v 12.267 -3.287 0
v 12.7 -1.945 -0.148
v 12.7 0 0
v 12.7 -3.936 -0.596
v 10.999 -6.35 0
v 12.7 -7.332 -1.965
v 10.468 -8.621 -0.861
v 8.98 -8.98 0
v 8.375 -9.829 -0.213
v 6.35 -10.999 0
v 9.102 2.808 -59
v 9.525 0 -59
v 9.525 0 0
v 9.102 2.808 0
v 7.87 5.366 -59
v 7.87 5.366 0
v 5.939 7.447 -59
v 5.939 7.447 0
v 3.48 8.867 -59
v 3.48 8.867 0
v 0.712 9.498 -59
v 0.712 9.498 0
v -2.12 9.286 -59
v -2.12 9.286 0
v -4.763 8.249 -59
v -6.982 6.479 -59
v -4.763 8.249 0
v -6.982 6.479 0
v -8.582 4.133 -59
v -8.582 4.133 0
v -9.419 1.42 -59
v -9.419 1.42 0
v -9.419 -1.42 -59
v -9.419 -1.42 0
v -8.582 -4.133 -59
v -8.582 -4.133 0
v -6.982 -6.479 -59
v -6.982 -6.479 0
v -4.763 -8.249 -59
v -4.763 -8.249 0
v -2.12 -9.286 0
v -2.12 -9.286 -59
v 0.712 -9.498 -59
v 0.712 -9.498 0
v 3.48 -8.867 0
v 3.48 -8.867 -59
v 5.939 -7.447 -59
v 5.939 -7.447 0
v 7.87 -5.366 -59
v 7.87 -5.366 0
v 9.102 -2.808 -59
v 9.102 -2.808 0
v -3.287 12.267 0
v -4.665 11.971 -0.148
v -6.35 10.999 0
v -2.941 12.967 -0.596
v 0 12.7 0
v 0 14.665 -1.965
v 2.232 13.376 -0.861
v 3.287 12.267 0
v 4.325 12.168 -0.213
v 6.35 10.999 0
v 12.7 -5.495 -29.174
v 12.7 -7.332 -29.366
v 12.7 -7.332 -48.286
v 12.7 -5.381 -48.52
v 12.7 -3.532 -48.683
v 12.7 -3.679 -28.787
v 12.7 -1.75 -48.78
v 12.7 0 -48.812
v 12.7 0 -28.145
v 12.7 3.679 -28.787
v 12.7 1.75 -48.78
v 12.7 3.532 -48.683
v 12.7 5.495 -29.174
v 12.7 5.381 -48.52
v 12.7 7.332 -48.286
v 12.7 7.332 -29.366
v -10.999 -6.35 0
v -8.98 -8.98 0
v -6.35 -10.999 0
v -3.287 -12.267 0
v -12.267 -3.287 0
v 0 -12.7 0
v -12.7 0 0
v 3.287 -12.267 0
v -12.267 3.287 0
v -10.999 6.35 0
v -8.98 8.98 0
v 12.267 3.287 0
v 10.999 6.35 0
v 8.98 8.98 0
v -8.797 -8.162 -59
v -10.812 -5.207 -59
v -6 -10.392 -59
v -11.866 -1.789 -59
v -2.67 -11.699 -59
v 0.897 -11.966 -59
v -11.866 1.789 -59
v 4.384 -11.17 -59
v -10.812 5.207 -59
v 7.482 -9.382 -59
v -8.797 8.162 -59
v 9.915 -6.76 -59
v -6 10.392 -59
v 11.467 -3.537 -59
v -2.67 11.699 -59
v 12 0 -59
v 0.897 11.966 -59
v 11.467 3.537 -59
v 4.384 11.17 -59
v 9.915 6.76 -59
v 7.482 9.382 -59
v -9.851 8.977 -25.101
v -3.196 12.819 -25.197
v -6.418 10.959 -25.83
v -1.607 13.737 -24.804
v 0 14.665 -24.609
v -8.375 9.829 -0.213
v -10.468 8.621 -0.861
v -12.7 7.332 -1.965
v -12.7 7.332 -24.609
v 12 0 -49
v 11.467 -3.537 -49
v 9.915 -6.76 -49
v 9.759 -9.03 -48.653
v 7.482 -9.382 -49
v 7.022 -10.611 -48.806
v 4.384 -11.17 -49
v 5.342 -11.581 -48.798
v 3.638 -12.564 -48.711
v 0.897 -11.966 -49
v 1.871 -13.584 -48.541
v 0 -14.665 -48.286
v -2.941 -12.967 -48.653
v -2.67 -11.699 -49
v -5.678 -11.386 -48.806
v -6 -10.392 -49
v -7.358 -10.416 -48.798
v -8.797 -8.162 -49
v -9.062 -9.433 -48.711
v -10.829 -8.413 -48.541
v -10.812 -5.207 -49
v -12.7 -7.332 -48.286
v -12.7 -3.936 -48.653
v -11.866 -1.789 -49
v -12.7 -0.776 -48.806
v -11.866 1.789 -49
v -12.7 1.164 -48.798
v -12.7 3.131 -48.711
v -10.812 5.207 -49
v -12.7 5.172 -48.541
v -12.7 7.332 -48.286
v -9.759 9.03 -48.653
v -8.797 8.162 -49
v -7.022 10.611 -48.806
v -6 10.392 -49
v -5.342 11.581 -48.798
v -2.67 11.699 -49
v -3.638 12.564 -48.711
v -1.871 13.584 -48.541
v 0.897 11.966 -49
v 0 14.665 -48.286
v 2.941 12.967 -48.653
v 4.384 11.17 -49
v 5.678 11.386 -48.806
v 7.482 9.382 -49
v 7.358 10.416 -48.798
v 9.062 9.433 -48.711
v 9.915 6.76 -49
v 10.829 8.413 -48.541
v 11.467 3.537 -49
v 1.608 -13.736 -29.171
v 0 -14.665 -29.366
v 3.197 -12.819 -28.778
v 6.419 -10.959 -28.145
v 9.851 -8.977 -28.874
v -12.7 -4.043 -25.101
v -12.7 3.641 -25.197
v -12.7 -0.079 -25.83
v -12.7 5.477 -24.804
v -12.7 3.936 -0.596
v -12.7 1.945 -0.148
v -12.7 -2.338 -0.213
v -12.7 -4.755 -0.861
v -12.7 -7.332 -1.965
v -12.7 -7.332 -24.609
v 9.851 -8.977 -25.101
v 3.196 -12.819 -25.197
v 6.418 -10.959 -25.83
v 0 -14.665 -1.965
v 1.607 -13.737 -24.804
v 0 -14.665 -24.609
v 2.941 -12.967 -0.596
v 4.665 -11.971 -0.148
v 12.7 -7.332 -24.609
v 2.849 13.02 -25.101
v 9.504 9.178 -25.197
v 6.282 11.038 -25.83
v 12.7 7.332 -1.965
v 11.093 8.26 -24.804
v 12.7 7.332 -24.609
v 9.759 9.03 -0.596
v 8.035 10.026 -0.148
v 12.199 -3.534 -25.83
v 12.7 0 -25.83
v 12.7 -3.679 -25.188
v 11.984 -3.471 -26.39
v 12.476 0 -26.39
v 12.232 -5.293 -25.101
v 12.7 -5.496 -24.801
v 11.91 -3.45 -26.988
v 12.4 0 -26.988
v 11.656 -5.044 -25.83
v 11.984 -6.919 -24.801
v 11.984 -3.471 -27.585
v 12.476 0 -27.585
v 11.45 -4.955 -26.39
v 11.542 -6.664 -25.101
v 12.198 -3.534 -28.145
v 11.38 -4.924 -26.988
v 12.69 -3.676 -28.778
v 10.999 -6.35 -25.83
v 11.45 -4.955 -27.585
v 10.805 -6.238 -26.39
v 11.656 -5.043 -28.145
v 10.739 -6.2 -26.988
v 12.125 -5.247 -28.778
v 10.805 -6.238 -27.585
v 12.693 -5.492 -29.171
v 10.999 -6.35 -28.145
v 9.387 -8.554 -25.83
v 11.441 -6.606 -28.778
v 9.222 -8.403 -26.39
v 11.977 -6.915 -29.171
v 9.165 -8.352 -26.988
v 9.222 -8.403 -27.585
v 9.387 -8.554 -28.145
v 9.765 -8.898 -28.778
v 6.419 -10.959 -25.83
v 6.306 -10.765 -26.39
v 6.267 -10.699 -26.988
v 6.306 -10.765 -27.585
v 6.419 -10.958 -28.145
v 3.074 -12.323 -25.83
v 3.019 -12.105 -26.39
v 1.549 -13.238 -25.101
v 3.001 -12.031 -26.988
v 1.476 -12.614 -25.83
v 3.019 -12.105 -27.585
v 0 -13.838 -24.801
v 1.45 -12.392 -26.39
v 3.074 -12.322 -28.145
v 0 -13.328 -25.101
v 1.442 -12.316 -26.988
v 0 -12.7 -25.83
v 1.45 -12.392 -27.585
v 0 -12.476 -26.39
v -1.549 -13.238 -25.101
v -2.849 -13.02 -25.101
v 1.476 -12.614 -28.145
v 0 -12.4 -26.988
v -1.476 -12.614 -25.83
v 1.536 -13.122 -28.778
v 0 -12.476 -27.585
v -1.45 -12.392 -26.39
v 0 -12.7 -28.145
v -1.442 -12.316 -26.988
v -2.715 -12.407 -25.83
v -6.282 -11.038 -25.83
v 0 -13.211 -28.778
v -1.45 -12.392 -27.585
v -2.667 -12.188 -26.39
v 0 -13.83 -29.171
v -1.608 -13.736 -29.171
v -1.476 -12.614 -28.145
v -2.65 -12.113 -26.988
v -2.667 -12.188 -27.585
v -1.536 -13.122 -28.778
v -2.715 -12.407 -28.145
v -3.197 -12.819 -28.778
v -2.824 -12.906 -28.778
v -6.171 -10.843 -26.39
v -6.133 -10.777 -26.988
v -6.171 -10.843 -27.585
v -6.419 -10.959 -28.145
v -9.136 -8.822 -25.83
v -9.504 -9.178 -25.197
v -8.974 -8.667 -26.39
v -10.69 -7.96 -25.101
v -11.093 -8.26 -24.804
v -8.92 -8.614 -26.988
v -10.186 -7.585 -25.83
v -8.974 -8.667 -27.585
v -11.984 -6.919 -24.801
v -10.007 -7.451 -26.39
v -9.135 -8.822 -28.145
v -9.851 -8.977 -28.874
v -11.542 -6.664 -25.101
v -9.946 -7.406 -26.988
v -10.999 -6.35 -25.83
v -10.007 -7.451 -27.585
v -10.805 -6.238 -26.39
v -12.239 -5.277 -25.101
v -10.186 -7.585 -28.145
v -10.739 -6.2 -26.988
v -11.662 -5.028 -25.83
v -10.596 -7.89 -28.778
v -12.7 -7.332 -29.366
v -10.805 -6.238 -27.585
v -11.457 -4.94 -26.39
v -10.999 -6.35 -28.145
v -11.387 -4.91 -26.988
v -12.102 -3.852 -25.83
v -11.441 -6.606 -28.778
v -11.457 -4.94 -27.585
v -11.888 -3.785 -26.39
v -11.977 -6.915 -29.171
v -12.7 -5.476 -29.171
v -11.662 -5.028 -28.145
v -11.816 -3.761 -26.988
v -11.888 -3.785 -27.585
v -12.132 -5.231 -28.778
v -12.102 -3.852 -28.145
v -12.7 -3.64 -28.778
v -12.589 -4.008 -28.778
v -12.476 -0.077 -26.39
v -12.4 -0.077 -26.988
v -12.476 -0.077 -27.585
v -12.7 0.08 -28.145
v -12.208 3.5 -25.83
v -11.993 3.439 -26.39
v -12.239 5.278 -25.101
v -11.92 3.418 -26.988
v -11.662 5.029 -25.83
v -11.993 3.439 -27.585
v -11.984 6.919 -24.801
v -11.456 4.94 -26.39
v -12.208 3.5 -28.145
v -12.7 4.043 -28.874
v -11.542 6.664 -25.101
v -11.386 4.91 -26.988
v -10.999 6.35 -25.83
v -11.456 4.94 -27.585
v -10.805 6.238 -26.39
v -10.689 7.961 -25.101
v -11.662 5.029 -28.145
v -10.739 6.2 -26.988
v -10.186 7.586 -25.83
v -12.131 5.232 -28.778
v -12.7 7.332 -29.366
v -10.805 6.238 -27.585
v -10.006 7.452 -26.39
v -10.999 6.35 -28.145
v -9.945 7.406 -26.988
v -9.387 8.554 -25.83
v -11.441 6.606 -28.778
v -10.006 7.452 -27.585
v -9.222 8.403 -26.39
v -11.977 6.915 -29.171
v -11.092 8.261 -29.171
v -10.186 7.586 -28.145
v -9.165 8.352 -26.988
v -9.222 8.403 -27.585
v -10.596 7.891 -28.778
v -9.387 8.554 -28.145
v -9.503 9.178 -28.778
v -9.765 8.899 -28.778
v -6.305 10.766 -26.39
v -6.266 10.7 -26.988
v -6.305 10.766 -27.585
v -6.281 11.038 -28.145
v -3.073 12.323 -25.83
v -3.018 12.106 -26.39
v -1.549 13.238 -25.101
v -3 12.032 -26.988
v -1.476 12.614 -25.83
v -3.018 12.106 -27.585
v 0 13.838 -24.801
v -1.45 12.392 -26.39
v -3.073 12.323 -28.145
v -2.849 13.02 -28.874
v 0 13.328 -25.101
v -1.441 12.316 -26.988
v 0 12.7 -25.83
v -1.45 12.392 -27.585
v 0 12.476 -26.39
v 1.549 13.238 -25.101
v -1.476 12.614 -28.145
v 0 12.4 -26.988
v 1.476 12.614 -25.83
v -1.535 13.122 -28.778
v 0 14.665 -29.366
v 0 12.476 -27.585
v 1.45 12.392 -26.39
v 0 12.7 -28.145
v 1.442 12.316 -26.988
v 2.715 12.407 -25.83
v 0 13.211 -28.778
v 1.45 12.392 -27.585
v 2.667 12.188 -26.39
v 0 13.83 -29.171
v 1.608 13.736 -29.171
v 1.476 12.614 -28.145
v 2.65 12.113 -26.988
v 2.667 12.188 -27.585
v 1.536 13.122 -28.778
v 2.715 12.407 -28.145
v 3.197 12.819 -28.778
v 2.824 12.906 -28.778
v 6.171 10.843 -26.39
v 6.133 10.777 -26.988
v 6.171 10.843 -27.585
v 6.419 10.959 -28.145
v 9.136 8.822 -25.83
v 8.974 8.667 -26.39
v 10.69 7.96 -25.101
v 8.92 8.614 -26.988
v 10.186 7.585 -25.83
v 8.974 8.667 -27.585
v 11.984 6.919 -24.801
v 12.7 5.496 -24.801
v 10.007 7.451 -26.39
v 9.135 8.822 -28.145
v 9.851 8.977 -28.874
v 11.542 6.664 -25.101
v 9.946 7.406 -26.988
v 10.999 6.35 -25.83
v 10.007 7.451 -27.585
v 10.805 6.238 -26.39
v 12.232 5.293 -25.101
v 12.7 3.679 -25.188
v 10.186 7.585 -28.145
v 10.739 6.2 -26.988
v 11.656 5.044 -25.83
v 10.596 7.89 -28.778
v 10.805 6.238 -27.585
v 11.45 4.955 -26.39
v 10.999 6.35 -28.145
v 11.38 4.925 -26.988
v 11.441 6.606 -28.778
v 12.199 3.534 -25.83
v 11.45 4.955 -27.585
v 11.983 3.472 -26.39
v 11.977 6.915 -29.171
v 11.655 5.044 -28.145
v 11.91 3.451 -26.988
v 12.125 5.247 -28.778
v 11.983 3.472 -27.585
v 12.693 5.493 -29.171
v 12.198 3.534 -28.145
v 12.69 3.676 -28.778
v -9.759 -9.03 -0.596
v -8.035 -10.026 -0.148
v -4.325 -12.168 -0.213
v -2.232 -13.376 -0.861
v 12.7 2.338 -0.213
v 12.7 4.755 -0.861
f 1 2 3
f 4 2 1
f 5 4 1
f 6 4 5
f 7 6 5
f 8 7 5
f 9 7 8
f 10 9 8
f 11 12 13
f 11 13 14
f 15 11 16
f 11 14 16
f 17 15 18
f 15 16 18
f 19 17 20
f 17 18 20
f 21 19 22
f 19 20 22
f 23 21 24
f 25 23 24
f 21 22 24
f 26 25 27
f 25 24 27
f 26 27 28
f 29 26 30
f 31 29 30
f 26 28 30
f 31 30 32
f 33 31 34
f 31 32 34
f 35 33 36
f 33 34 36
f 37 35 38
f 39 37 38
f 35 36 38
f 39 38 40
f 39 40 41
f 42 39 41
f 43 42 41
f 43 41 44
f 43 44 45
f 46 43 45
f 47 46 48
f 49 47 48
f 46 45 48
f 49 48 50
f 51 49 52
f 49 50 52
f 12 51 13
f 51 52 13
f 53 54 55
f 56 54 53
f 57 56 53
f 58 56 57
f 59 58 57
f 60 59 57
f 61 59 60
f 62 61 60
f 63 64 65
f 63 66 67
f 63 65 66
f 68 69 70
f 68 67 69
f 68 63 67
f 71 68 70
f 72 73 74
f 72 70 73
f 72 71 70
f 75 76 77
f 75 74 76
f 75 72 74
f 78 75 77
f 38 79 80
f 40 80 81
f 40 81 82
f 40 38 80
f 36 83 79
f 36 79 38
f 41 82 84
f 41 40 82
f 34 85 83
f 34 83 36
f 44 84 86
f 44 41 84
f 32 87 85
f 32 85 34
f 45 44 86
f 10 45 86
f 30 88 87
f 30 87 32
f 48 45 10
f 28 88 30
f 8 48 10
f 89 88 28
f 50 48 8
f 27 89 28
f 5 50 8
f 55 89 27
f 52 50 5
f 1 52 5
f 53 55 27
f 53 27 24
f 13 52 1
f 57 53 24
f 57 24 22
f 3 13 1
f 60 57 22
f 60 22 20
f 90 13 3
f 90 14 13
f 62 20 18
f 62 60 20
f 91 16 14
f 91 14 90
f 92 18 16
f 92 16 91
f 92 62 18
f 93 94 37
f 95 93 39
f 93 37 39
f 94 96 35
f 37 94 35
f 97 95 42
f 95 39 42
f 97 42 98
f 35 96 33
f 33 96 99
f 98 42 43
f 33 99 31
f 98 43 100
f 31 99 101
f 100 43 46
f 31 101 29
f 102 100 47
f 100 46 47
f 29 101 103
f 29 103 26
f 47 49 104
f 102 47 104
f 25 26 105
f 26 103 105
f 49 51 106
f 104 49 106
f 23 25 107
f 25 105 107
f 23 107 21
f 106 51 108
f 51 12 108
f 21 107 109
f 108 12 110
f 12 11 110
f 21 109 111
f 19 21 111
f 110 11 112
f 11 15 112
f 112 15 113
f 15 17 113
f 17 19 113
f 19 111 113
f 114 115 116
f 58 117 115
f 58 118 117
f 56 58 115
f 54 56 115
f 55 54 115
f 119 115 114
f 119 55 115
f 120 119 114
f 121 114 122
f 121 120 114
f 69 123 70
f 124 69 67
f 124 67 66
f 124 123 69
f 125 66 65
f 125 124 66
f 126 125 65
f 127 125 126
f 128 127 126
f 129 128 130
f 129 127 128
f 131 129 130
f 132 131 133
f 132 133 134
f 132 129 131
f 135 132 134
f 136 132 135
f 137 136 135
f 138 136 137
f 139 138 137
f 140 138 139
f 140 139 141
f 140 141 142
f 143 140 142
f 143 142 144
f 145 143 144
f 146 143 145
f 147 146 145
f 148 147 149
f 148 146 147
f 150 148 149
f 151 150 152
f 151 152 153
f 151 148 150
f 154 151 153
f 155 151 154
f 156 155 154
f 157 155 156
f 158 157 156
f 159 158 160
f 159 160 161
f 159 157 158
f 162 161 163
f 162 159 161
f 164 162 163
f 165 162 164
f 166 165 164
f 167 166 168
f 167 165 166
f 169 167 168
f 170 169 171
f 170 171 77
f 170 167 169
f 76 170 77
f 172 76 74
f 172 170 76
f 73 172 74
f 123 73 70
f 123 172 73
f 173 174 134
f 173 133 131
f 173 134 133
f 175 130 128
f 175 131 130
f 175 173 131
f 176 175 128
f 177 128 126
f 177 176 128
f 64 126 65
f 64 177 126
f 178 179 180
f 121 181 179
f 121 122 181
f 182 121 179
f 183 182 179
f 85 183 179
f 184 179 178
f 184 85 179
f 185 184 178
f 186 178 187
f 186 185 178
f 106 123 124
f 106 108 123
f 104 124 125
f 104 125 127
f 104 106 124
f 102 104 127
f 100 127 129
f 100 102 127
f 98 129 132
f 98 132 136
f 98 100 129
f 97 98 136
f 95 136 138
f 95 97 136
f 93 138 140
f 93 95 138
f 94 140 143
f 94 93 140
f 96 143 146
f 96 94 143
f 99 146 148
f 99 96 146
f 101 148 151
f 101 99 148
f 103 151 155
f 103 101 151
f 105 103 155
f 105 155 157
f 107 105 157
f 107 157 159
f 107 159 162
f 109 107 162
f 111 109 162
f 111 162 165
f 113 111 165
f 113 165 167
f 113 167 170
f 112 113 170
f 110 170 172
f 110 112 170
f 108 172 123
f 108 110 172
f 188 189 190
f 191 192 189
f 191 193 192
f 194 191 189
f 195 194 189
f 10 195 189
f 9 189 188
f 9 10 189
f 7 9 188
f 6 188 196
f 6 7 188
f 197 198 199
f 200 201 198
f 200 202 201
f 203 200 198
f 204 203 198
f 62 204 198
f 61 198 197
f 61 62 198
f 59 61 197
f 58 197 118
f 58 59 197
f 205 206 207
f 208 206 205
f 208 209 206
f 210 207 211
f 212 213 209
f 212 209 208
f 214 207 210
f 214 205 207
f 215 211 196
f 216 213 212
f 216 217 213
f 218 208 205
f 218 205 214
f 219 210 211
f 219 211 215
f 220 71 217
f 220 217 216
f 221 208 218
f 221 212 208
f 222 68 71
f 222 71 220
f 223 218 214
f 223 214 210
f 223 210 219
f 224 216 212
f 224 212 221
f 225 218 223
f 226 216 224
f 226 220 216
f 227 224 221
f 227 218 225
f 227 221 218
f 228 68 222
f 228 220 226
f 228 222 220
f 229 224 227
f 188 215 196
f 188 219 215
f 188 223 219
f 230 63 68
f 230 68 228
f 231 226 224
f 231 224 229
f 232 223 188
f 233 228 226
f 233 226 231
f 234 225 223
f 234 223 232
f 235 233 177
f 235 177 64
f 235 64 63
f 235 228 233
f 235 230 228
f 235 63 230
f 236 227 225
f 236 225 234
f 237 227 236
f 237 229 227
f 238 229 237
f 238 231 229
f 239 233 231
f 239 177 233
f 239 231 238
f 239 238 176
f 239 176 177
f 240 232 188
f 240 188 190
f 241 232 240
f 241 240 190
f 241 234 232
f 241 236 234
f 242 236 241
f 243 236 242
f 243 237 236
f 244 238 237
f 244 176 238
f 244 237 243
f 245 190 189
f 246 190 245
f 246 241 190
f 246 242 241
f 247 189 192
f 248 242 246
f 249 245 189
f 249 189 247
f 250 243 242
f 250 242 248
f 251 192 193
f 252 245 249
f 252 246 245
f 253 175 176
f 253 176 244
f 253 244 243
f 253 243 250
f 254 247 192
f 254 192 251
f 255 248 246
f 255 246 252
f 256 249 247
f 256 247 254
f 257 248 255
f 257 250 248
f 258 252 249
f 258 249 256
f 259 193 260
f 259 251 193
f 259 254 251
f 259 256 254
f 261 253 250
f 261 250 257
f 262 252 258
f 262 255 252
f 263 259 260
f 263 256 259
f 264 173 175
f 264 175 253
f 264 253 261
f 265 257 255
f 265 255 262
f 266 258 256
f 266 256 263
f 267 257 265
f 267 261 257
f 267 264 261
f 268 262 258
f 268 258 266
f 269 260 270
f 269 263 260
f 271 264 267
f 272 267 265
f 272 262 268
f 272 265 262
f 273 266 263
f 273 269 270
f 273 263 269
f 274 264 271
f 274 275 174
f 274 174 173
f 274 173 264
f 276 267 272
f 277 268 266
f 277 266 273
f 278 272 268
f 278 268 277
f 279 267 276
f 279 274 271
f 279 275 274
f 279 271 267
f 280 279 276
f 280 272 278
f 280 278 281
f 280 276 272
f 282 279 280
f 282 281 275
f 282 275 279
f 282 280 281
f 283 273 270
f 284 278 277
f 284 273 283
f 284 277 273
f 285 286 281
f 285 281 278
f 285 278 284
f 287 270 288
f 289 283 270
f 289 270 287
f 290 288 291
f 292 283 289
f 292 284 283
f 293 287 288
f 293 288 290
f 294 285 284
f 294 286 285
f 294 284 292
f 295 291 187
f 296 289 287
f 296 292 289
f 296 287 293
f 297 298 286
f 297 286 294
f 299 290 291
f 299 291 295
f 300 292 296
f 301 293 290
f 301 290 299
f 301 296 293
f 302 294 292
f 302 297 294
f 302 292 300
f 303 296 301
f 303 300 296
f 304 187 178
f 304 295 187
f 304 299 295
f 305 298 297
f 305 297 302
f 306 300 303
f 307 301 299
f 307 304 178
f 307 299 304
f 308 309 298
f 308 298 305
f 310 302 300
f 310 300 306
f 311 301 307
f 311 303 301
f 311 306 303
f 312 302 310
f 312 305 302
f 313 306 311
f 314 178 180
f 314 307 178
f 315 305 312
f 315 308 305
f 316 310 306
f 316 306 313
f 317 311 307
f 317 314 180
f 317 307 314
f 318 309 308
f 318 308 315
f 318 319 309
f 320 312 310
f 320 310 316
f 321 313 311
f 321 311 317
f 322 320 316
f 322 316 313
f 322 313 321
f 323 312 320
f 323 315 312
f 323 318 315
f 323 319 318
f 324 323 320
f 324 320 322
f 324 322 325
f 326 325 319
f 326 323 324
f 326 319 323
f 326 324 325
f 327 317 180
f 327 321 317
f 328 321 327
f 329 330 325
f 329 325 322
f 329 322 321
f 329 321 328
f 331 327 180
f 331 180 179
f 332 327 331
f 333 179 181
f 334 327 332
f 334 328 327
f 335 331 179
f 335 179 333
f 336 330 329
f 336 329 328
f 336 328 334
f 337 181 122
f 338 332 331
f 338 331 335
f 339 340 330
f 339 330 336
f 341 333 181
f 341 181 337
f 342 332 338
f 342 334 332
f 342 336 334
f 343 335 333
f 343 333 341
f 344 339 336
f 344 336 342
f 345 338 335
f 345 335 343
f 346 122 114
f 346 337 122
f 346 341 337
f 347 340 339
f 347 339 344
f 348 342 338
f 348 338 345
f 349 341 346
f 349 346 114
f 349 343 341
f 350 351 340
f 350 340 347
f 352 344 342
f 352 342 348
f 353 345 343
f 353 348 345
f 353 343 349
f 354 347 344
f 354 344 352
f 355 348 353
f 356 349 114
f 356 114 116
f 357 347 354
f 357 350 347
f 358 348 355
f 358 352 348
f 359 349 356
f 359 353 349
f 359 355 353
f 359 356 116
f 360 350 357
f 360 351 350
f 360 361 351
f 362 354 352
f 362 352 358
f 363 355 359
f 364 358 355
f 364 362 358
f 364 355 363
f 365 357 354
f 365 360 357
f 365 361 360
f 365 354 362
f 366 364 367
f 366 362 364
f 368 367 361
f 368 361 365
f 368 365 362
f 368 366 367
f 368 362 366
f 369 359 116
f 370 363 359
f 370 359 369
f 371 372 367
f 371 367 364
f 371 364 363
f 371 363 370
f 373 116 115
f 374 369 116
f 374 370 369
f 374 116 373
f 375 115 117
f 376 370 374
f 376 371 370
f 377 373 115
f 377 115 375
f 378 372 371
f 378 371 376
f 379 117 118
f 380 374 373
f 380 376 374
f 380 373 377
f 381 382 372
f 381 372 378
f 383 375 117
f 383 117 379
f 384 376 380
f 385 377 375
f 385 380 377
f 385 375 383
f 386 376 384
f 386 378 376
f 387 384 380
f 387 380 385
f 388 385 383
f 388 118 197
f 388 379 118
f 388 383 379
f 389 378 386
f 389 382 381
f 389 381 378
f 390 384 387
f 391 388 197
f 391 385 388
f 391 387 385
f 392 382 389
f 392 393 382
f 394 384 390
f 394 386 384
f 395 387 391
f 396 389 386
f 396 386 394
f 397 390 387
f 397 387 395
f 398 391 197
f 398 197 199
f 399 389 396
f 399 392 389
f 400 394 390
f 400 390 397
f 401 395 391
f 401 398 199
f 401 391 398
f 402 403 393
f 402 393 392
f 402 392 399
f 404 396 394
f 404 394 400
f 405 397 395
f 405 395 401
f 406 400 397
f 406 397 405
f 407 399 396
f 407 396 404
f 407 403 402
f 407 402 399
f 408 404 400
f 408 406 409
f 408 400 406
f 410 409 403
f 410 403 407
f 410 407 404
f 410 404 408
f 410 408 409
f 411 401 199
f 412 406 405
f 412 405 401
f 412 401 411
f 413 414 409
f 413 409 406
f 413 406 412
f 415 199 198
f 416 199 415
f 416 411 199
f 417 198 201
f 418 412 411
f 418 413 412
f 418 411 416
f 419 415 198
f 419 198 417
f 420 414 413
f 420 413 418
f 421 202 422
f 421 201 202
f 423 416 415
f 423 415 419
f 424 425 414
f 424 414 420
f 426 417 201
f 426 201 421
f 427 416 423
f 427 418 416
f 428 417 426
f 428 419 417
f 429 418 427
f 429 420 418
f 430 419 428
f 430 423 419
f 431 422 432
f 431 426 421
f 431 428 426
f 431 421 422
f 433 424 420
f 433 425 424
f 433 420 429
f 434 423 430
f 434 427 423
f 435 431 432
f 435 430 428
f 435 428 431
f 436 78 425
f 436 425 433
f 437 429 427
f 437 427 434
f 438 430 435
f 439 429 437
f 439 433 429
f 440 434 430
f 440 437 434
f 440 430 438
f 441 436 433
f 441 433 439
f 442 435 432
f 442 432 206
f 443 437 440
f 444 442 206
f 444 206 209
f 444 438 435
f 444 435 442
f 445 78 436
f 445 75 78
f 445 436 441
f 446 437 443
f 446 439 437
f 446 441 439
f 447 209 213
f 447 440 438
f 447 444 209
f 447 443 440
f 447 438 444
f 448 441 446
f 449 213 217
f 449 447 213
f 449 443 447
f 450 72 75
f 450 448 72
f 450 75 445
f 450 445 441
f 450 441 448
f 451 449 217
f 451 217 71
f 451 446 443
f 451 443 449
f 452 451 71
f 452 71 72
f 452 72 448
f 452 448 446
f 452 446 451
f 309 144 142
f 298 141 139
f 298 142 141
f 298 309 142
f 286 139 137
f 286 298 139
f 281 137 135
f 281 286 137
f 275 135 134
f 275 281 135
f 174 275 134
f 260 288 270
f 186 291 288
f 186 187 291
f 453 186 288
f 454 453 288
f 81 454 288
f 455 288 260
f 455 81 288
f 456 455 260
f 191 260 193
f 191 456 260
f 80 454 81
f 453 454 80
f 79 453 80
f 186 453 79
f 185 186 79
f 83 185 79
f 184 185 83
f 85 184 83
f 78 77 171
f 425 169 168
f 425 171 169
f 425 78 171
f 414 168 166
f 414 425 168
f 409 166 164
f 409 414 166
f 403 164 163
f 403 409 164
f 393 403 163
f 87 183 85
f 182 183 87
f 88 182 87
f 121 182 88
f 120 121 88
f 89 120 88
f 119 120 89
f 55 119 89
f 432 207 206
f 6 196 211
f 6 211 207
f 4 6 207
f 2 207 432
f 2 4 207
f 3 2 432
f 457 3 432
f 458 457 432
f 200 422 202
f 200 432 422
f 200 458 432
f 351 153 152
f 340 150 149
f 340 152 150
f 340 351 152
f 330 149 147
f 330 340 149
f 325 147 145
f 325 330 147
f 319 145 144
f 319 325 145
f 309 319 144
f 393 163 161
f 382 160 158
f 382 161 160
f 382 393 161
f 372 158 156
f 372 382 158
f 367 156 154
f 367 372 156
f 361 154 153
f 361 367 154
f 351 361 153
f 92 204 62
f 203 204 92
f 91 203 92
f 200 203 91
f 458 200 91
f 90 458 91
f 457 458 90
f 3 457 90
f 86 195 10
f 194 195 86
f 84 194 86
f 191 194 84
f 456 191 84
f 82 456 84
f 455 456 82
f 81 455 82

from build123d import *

# Parameters (mm, degrees)
SKETCH1_R      = 9.525
EXTRUDE1_DEPTH = 59
SKETCH2_R      = 2.38125


with BuildPart() as part:
    # Sketch1 → Extrude1 (new body)
    with BuildSketch(Plane.XY):
        Polygon((-12.7, 7.332348419), (-12.7, -7.332348419), (0, -14.664696837), (12.7, -7.332348419), (12.7, 7.332348419), (0, 14.664696837), align=None)
        Circle(SKETCH1_R, mode=Mode.SUBTRACT)
    extrude(amount=-EXTRUDE1_DEPTH)

    # Sketch2 → Cut-Revolve3 (revolve, cut)
    with BuildSketch(Plane(origin=(0, 0, 0), x_dir=(0, 0, -1), z_dir=(1, 0, 0)), mode=Mode.PRIVATE) as cut_revolve3_sk:
        Polygon((59, 14.664696837), (48.285996634, 14.664696837), (49, 12), (59, 12), align=None)
        Polygon((1.964696837, 14.664696837), (0, 14.664696837), (0, 12.7), align=None)
        with Locations((26.9875, 14.78125)):
            Circle(SKETCH2_R)
    revolve(cut_revolve3_sk.sketch.rotate(Axis((0, 0, 0), (0, 0, -1)), 90), axis=Axis((0, 0, 0), (0, 0, -1)), mode=Mode.SUBTRACT)


solid = part.part
